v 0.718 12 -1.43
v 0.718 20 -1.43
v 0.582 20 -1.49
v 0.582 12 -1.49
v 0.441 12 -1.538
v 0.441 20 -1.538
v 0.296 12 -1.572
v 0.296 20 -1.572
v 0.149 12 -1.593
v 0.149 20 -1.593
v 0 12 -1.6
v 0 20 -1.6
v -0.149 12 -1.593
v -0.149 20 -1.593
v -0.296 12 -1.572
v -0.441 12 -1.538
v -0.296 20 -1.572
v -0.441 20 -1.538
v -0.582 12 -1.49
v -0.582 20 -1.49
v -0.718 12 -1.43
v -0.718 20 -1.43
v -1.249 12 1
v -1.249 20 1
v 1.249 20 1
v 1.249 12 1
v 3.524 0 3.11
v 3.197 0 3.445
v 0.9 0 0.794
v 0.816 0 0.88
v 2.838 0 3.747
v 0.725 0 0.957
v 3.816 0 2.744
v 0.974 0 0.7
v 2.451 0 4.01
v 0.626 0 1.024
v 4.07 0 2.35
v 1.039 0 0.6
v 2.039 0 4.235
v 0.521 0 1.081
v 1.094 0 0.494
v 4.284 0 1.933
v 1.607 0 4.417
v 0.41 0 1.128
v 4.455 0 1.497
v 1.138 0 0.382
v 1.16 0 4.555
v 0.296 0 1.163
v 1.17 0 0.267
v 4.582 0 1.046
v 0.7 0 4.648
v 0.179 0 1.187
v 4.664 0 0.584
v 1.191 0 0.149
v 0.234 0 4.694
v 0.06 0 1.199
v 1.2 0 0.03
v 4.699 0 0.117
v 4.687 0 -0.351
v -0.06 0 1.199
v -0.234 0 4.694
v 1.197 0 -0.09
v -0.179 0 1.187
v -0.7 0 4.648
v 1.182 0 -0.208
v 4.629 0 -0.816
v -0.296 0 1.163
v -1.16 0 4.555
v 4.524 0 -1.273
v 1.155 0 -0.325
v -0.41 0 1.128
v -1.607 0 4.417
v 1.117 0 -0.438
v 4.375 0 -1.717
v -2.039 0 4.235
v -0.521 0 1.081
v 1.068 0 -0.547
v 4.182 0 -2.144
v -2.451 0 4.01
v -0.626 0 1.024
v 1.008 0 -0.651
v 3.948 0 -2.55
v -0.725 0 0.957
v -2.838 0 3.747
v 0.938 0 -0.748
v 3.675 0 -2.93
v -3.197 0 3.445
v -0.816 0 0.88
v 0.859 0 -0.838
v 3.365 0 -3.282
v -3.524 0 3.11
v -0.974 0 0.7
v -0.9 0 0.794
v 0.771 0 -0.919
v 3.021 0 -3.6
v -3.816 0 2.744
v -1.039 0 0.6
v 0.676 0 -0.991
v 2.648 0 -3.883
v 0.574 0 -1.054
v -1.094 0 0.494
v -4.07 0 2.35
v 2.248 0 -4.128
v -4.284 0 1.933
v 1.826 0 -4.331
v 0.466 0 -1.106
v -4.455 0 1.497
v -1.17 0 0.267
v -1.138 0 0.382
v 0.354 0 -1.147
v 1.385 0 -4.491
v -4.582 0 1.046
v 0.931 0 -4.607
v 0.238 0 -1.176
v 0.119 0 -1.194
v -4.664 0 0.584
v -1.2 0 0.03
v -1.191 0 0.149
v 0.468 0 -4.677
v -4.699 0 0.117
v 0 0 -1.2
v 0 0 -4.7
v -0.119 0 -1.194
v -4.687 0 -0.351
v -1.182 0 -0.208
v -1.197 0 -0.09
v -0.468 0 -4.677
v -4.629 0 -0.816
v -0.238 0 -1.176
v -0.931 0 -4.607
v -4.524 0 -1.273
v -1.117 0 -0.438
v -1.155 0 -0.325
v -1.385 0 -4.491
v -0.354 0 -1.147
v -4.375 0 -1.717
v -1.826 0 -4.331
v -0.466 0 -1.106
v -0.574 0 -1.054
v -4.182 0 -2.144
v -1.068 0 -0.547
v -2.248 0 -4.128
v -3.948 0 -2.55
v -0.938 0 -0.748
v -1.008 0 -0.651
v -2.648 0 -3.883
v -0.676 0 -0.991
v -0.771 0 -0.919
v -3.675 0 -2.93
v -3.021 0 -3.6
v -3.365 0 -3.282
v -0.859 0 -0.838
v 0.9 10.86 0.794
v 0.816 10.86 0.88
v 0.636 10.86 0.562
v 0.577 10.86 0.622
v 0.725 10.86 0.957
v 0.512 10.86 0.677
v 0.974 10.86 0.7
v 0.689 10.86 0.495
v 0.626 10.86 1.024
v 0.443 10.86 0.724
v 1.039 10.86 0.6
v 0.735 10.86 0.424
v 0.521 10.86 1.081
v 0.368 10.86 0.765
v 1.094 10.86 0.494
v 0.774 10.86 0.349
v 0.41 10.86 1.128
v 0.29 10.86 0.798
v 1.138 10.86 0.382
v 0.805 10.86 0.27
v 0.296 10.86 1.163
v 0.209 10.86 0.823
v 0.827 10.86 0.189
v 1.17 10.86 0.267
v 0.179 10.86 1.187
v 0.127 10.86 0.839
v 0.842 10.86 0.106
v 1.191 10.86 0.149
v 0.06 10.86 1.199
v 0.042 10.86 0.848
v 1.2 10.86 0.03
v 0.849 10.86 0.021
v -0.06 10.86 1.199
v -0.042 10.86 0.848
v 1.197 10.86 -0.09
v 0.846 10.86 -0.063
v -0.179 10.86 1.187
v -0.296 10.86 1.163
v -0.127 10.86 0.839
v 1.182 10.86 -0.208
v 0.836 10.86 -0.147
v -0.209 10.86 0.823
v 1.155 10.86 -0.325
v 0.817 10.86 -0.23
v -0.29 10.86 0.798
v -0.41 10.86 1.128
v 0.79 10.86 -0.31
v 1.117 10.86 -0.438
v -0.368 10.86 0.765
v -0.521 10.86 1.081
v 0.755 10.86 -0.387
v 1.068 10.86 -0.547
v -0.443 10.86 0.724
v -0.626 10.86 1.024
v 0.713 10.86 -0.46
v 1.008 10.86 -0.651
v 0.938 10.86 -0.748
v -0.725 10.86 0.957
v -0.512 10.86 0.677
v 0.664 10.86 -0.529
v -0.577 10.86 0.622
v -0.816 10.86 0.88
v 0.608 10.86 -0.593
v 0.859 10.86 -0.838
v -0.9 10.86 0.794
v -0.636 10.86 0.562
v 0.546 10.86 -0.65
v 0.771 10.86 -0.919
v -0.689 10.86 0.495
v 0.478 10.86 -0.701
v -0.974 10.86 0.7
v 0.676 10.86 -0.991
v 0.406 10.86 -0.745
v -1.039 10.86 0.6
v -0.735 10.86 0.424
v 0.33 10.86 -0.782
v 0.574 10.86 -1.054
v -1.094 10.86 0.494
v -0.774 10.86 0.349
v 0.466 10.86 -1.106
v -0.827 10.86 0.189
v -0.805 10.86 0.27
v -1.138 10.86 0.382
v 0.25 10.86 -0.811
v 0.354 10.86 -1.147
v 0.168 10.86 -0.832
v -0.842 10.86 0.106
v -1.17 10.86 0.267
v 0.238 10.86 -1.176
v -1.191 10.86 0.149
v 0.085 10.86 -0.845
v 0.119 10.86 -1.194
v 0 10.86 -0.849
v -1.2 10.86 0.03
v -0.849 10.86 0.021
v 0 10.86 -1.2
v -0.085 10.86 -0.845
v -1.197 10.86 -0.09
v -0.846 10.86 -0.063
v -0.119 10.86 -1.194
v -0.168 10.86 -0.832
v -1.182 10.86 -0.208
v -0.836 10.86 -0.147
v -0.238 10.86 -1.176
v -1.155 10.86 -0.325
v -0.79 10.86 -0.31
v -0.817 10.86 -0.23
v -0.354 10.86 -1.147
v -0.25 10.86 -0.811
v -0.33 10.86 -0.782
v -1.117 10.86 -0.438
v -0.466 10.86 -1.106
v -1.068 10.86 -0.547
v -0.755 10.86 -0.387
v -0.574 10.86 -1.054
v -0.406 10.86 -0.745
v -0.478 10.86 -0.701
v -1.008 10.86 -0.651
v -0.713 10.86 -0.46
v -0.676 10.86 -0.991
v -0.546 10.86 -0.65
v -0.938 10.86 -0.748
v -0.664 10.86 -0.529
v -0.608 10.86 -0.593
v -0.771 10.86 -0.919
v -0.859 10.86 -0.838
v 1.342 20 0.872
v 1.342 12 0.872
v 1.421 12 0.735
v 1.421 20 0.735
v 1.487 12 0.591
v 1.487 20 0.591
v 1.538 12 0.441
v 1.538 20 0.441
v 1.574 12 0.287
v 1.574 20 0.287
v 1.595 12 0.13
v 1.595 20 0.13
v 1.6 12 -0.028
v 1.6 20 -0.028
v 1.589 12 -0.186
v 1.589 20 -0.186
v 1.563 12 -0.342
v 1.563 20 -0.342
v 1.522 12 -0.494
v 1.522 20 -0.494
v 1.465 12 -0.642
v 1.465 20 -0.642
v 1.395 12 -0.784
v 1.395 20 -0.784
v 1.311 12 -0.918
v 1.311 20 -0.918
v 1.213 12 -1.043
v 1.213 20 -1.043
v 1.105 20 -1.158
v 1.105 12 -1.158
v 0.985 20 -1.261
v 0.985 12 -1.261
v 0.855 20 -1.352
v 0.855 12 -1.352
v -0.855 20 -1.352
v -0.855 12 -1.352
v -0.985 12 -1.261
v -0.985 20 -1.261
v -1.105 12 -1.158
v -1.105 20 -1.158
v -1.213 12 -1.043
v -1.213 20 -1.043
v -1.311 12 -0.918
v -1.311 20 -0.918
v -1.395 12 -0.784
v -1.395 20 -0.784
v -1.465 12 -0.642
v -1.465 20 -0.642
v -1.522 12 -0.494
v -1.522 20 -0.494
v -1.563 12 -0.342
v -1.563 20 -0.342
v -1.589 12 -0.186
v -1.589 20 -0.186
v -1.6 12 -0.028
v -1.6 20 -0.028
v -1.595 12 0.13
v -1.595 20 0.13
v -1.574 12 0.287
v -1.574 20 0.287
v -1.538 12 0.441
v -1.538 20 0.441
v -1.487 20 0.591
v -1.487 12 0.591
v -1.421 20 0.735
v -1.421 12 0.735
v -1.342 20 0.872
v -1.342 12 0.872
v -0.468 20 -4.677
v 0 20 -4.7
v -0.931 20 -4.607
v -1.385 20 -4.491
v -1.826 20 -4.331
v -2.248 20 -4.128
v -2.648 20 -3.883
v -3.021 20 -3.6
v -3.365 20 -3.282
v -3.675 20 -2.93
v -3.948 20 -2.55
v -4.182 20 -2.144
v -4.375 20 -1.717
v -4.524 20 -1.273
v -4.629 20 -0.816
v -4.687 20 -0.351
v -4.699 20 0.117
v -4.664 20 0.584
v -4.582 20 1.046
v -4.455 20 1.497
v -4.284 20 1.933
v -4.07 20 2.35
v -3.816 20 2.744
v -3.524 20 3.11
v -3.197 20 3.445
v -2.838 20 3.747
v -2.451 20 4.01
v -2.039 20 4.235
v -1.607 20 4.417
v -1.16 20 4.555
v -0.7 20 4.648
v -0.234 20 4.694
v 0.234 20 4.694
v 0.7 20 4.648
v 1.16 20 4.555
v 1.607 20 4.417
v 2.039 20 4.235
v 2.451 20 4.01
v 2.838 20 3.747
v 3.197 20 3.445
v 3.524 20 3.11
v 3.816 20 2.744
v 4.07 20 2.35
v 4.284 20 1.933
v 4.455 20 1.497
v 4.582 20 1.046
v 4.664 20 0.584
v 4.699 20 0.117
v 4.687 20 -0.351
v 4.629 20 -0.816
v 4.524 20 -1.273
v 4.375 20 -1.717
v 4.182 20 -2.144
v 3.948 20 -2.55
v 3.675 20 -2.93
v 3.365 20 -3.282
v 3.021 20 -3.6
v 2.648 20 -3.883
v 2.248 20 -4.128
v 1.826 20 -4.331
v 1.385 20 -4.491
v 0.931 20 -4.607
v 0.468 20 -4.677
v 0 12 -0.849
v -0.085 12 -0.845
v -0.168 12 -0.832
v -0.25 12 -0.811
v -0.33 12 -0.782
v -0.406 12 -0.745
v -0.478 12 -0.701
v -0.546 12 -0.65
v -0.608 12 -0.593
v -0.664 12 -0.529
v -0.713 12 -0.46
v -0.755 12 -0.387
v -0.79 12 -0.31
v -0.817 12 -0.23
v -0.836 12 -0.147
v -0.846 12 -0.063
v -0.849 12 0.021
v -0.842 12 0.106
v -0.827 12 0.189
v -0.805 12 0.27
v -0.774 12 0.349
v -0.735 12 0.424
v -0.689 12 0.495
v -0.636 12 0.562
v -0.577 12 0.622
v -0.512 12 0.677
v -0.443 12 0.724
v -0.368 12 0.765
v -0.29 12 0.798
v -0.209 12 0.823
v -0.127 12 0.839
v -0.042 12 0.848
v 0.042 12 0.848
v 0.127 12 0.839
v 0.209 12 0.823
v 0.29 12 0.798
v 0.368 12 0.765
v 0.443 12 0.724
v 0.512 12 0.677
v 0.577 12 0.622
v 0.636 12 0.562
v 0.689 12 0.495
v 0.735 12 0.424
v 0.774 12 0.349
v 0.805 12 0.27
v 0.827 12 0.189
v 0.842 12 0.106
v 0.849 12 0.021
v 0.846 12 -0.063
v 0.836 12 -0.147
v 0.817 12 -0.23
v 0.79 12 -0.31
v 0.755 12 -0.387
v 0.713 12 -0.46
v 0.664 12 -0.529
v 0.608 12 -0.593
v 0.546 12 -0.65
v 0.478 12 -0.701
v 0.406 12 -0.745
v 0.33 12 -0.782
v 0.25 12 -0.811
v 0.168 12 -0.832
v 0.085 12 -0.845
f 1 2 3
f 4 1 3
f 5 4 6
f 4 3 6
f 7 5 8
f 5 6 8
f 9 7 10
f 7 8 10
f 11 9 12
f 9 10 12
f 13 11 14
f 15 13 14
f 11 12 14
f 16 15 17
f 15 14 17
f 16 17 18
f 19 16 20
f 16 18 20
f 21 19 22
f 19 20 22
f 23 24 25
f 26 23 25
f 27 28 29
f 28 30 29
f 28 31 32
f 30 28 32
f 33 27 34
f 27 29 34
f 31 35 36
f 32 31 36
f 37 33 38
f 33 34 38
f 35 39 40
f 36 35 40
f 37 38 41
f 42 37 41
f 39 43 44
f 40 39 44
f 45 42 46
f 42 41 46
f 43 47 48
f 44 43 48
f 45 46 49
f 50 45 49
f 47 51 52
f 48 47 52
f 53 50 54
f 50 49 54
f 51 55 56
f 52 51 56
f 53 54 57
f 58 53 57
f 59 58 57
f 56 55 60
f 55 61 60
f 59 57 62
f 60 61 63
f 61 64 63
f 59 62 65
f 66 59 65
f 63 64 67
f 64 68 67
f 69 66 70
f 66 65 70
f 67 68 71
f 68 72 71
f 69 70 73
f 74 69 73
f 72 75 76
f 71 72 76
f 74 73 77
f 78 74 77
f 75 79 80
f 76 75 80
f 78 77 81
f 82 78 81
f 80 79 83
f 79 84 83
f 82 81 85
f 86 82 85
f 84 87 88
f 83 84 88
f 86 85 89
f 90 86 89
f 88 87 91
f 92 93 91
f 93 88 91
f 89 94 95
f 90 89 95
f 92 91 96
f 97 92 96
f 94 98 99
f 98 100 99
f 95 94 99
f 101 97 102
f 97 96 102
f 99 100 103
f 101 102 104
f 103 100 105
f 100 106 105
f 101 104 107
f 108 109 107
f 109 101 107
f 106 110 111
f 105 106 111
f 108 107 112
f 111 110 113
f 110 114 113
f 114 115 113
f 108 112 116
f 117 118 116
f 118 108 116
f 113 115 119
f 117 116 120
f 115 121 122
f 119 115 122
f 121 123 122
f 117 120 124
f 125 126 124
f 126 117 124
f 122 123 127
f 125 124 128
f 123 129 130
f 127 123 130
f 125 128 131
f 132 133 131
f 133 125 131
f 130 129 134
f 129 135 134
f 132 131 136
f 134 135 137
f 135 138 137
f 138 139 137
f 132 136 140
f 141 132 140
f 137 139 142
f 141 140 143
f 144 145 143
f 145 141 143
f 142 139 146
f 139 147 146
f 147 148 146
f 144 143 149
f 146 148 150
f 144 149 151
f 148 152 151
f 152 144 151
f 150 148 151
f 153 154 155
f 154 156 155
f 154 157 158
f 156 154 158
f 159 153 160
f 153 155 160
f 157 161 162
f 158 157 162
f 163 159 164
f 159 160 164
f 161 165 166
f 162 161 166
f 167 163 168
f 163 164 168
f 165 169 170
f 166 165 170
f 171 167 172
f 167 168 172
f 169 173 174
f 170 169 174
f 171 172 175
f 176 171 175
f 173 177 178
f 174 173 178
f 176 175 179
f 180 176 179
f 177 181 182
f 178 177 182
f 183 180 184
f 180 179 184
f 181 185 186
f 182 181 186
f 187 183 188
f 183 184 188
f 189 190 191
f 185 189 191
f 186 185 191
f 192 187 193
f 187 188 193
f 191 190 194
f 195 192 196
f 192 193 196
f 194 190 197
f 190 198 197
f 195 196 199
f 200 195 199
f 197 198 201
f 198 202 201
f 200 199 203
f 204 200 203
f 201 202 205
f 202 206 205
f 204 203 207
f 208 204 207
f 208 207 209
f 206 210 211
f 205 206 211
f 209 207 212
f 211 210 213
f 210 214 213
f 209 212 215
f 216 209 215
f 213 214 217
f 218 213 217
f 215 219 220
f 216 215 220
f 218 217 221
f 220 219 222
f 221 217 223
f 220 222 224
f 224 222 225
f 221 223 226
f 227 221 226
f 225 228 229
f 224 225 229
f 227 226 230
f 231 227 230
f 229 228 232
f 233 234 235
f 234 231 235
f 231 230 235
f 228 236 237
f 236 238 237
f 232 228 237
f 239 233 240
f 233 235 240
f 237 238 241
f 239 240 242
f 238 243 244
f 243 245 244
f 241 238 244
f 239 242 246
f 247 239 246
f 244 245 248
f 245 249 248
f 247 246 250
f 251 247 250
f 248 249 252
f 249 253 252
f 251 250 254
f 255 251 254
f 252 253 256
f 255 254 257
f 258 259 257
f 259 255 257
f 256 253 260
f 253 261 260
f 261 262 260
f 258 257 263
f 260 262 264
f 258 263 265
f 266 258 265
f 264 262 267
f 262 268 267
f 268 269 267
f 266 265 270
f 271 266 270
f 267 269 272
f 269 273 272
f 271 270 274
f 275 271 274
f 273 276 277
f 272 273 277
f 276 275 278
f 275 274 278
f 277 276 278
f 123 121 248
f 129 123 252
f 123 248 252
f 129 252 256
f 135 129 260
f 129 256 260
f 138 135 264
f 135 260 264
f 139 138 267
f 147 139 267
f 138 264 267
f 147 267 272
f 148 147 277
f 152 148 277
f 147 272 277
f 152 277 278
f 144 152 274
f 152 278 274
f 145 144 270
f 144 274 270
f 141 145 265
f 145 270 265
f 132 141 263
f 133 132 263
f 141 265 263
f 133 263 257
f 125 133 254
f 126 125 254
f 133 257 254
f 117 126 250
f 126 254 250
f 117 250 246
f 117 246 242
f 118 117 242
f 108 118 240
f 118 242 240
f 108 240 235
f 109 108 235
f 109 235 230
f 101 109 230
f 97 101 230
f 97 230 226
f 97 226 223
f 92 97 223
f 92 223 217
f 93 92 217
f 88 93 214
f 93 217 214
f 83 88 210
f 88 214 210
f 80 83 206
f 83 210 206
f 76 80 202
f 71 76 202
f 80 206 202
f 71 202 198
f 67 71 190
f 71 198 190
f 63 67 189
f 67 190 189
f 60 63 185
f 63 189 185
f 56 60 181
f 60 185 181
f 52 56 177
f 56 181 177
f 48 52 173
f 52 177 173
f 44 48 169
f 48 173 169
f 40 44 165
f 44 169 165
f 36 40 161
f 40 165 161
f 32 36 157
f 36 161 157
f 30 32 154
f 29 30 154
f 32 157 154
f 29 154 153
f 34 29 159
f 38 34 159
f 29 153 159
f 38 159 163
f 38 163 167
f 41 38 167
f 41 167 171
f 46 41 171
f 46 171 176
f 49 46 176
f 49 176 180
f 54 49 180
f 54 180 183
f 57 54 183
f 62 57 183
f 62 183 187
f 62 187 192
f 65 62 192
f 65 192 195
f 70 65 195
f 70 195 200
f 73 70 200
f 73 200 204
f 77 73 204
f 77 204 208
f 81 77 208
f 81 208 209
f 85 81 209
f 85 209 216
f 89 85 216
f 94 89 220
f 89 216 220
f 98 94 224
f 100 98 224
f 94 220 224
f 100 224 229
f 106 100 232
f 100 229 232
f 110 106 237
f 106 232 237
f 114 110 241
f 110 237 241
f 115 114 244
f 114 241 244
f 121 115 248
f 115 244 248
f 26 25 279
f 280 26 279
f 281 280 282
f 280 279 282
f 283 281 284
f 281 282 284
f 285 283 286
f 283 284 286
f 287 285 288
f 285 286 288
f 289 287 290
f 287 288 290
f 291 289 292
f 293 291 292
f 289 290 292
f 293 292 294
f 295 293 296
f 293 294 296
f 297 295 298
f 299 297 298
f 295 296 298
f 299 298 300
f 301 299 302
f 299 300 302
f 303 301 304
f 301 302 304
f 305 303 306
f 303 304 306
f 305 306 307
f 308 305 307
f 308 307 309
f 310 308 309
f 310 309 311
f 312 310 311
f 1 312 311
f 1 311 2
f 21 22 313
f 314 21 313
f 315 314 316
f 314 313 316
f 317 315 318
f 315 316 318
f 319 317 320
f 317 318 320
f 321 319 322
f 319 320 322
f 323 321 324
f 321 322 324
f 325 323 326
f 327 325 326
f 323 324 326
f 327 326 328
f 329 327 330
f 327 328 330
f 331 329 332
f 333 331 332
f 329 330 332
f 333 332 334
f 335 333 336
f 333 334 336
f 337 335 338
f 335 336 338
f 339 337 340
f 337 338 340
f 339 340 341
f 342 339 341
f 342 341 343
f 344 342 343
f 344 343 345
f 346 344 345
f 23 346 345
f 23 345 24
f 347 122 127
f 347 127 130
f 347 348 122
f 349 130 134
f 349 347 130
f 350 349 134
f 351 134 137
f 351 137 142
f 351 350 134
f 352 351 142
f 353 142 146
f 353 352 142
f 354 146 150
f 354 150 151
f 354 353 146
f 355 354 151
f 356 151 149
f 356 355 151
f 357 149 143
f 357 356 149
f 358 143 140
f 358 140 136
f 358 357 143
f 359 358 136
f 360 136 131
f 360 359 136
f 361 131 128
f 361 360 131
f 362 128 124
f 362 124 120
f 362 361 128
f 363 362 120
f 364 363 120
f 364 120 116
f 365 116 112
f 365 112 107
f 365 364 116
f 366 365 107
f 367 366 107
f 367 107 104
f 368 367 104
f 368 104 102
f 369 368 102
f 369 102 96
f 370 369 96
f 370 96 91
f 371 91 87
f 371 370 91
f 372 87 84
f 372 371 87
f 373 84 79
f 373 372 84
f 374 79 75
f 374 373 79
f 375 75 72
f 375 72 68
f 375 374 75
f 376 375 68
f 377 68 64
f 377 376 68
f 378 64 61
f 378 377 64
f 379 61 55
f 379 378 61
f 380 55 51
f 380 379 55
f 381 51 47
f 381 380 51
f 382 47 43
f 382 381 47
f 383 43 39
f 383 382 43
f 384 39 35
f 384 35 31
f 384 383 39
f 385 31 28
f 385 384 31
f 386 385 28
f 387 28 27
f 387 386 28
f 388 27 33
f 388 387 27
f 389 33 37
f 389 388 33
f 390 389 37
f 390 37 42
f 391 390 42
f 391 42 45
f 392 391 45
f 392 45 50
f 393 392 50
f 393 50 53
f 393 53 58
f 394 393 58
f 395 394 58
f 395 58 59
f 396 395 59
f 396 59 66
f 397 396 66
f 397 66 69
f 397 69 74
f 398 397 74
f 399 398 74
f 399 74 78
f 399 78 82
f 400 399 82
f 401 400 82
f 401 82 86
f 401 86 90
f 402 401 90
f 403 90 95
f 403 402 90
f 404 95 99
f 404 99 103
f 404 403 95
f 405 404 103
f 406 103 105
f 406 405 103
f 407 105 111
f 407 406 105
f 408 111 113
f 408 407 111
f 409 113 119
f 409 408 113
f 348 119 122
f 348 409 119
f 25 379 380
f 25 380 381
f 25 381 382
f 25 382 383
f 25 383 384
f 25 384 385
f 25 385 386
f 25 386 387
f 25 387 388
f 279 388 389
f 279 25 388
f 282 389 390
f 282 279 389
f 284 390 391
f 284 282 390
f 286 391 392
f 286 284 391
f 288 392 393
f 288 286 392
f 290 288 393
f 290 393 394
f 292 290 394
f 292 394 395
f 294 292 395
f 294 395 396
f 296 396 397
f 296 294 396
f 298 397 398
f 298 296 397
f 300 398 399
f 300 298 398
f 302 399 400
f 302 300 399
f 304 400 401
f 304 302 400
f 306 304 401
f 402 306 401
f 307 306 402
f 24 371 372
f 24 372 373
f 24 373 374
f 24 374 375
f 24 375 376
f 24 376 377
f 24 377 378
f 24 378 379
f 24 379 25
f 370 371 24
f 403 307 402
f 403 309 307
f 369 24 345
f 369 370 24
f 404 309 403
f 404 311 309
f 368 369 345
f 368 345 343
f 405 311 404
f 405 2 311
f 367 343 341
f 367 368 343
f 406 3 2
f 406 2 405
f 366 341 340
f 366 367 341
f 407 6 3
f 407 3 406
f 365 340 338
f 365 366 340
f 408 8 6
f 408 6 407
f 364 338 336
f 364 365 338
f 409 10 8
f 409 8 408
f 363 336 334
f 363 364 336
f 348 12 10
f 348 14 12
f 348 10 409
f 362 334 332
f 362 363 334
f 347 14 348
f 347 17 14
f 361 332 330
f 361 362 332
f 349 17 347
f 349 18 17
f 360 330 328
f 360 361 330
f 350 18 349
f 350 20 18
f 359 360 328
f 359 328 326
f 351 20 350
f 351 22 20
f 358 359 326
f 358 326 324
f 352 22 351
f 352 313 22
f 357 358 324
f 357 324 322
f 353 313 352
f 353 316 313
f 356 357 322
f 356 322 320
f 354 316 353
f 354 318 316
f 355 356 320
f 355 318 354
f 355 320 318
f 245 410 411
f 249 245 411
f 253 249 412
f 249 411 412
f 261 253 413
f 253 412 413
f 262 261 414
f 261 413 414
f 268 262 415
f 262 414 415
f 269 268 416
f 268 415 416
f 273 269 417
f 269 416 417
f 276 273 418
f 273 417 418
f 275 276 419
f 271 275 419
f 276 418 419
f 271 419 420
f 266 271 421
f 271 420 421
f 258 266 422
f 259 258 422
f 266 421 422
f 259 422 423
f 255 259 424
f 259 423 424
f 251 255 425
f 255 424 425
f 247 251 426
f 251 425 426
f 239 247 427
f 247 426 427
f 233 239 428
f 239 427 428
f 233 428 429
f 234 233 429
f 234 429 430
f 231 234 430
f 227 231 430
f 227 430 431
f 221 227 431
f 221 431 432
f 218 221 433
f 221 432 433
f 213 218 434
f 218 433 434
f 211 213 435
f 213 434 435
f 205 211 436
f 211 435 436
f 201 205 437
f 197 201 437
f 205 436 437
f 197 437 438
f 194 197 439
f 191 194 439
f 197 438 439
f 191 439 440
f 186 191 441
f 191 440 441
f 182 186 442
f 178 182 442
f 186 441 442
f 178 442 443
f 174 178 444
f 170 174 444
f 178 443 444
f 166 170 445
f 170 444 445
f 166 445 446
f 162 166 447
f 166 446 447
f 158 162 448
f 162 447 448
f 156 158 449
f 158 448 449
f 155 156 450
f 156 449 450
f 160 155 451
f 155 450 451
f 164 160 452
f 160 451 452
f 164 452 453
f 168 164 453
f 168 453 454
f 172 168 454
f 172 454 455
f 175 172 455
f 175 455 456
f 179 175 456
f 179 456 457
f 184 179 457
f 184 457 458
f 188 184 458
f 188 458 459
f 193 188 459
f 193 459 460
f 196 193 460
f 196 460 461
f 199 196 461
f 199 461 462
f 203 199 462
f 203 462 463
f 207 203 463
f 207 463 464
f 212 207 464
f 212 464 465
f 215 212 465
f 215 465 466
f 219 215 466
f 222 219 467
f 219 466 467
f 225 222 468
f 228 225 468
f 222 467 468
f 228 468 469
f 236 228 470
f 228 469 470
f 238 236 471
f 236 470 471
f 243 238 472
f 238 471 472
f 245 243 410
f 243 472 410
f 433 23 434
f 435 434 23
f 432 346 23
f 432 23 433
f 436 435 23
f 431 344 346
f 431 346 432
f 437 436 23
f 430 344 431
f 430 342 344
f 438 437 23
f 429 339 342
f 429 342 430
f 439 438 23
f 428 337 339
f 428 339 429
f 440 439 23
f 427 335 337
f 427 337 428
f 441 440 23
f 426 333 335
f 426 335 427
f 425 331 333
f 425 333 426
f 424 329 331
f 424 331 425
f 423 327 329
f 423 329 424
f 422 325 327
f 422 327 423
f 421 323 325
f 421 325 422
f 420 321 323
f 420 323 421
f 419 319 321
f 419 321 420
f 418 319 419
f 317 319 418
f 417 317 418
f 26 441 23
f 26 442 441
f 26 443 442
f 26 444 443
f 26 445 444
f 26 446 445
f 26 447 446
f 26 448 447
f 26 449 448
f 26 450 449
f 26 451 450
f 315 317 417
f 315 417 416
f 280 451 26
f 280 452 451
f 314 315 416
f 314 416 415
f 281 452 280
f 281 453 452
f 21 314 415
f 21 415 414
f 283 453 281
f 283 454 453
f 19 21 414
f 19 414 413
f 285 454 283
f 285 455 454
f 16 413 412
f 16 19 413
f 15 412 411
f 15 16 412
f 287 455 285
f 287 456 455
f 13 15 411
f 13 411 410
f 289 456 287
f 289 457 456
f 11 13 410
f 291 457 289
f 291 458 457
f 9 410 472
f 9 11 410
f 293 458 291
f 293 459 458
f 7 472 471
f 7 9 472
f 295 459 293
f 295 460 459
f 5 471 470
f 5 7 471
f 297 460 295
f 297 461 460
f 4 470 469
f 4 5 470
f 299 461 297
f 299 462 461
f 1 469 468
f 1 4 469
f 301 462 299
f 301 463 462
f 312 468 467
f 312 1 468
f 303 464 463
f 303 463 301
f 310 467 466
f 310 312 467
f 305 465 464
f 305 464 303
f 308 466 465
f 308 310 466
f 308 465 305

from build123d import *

# Parameters (mm, degrees)
SKETCH1_W          = 3.5
SKETCH1_H          = 20
SKETCH1_W_2        = 0.351227394
SKETCH1_H_2        = 9.140463919
SKETCH3_R          = 0.848772606
CUT_EXTRUDE1_DEPTH = 8


with BuildPart() as part:
    # Sketch1 → Revolve1 (revolve)
    with BuildSketch(Plane.XY, mode=Mode.PRIVATE) as revolve1_sk:
        with Locations((-2.95, 10)):
            Rectangle(SKETCH1_W, SKETCH1_H)
        with Locations((-1.024386303, 15.429768041)):
            Rectangle(SKETCH1_W_2, SKETCH1_H_2)
    revolve(revolve1_sk.sketch.rotate(Axis((0, 0, 0), (0, 1, 0)), 270), axis=Axis((0, 0, 0), (0, 1, 0)))

    # Sketch3 → Cut-Extrude1 (cut)
    # profile 1 of 5: a face of its own
    with BuildSketch(Plane(origin=(0, 20, 0), x_dir=(1, 0, 0), z_dir=(0, 1, 0))):
        with BuildLine():
            Line((0.452879675, 1.43), (-0.452879675, 1.43))
            ThreePointArc((-0.452879675, 1.43), (-1.428365431, 0.458008946), (-1.2, -0.9))
            Line((-1.2, -0.9), (1.2, -0.9))
            ThreePointArc((1.2, -0.9), (1.428365431, 0.458008946), (0.452879675, 1.43))
        make_face()
        with Locations(Location((0, 0, 0), (0, 0, 90))):
            Circle(SKETCH3_R, mode=Mode.SUBTRACT)
    # profile 2 of 5: a face of its own
    with BuildSketch(Plane(origin=(0, 20, 0), x_dir=(1, 0, 0), z_dir=(0, 1, 0))):
        with BuildLine():
            ThreePointArc((0.452879675, 1.43), (0, 1.5), (-0.452879675, 1.43))
            Line((-0.452879675, 1.43), (0.452879675, 1.43))
        make_face()
    # profile 3 of 5: a face of its own
    with BuildSketch(Plane(origin=(0, 20, 0), x_dir=(1, 0, 0), z_dir=(0, 1, 0))):
        with BuildLine():
            ThreePointArc((0.717704675, 1.43), (0, 1.6), (-0.717704675, 1.43))
            Line((-0.717704675, 1.43), (-0.452879675, 1.43))
            ThreePointArc((-0.452879675, 1.43), (0, 1.5), (0.452879675, 1.43))
            Line((0.452879675, 1.43), (0.717704675, 1.43))
        make_face()
    # profile 4 of 5: a face of its own
    with BuildSketch(Plane(origin=(0, 20, 0), x_dir=(1, 0, 0), z_dir=(0, 1, 0))):
        with BuildLine():
            ThreePointArc((-0.717704675, 1.43), (-1.56307595, 0.341750749), (-1.2489996, -1))
            Line((-1.2489996, -1), (1.2489996, -1))
            ThreePointArc((1.2489996, -1), (1.56307595, 0.341750749), (0.717704675, 1.43))
            Line((0.717704675, 1.43), (0.452879675, 1.43))
            ThreePointArc((0.452879675, 1.43), (1.428365431, 0.458008946), (1.2, -0.9))
            Line((1.2, -0.9), (-1.2, -0.9))
            ThreePointArc((-1.2, -0.9), (-1.428365431, 0.458008946), (-0.452879675, 1.43))
            Line((-0.452879675, 1.43), (-0.717704675, 1.43))
        make_face()
    # profile 5 of 5: a face of its own
    with BuildSketch(Plane(origin=(0, 20, 0), x_dir=(1, 0, 0), z_dir=(0, 1, 0))):
        with Locations(Location((0, 0, 0), (0, 0, 90))):
            Circle(SKETCH3_R)
    extrude(amount=-CUT_EXTRUDE1_DEPTH, mode=Mode.SUBTRACT)


solid = part.part
